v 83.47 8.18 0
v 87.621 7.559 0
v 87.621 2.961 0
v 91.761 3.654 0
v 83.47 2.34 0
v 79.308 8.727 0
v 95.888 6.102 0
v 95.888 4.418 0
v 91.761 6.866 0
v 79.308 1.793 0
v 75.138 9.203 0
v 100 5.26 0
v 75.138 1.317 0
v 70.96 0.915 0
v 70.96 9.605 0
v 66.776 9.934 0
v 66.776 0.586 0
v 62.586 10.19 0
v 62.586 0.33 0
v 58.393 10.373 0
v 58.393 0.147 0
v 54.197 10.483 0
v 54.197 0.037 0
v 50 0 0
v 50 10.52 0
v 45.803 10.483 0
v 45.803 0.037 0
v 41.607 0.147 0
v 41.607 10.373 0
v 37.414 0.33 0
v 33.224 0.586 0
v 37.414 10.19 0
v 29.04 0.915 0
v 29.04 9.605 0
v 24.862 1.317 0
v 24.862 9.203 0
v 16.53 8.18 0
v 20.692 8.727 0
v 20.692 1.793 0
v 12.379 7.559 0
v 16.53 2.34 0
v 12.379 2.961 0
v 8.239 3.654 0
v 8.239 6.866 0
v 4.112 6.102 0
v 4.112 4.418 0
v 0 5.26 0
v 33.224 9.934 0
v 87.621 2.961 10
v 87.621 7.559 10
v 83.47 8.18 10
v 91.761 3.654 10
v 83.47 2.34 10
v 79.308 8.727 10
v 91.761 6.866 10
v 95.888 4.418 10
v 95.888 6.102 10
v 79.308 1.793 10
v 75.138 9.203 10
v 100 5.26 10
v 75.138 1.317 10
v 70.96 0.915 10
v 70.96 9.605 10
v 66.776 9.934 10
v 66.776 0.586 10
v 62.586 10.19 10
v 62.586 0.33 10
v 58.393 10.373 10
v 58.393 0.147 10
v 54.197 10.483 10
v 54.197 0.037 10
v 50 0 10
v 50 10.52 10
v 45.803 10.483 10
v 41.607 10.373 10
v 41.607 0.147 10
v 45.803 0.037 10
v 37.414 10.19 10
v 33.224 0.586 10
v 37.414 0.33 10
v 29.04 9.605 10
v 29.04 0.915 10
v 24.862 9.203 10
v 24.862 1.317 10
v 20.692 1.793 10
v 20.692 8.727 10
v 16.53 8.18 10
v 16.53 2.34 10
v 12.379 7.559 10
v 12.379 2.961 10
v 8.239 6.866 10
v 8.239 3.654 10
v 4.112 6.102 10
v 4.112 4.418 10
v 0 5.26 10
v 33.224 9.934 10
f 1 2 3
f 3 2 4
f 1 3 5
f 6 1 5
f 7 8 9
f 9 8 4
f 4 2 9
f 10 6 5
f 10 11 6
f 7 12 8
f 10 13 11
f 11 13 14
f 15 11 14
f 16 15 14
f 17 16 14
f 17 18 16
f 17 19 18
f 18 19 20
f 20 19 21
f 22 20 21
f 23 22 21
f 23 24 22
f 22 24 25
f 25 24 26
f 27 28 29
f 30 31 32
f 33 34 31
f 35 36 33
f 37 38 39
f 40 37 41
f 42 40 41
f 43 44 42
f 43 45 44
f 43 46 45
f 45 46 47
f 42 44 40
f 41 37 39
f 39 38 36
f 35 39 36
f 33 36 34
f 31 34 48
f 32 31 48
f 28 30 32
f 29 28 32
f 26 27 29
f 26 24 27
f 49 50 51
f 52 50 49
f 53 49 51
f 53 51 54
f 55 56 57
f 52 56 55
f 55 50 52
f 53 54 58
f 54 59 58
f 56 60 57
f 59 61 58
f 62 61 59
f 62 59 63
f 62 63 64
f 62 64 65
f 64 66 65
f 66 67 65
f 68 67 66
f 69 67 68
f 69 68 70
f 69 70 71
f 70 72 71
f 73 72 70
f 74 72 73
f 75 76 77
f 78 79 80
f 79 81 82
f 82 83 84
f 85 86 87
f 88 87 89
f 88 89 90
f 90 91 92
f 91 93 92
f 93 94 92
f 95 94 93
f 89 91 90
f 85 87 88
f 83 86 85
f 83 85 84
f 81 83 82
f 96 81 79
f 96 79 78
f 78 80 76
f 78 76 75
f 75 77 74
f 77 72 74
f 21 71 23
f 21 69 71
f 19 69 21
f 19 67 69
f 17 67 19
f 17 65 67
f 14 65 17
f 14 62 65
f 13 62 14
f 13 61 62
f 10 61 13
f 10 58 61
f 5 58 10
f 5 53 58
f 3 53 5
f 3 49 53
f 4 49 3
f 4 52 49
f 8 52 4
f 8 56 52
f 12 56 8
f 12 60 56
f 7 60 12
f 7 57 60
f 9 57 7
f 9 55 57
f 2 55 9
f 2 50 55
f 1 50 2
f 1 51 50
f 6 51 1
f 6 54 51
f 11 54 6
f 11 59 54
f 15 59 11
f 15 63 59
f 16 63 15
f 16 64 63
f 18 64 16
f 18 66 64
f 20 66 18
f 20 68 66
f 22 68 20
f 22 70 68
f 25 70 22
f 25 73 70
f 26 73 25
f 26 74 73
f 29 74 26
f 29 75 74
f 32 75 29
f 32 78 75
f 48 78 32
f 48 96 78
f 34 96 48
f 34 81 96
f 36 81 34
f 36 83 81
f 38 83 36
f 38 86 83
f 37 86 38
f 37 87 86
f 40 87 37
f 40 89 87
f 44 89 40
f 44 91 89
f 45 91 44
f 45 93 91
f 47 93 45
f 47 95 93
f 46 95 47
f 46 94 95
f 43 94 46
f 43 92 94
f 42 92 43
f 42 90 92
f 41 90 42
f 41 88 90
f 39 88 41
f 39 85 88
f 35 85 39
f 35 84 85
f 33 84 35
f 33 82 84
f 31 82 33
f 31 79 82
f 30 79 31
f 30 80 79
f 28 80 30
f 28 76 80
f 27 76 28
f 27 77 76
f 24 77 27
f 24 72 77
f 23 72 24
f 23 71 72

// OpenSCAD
$fn = 32;

// ----------------------------------------------------------------------
// Arc profile plate: lens, 48 points
// ----------------------------------------------------------------------

// --- parameters (mm) ---
lens_chord = 100;         // chord length of the lens, X
arc_r = 240.49;           // radius of both arcs
arc_angle = 24;           // angle of each arc, degrees
sagitta = 5.26;           // bulge of each arc (half the lens height)
arc_step = 1;             // sampling step of the arcs, degrees
plate_t = 10;             // plate thickness, Z

bbox_y = 2 * sagitta;  // full lens height

profile = [[100, 5.26], [95.888, 6.102], [91.761, 6.866], [87.621, 7.559], [83.47, 8.18], [79.308, 8.727], [75.138, 9.203], [70.96, 9.605], [66.776, 9.934], [62.586, 10.19], [58.393, 10.373], [54.197, 10.483], [50, 10.52], [45.803, 10.483], [41.607, 10.373], [37.414, 10.19], [33.224, 9.934], [29.04, 9.605], [24.862, 9.203], [20.692, 8.727], [16.53, 8.18], [12.379, 7.559], [8.239, 6.866], [4.112, 6.102], [0, 5.26], [4.112, 4.418], [8.239, 3.654], [12.379, 2.961], [16.53, 2.34], [20.692, 1.793], [24.862, 1.317], [29.04, 0.915], [33.224, 0.586], [37.414, 0.33], [41.607, 0.147], [45.803, 0.037], [50, 0], [54.197, 0.037], [58.393, 0.147], [62.586, 0.33], [66.776, 0.586], [70.96, 0.915], [75.138, 1.317], [79.308, 1.793], [83.47, 2.34], [87.621, 2.961], [91.761, 3.654], [95.888, 4.418]];  // primary outline, 48 points, counter clockwise

// --- the one profile operation ---
linear_extrude(height = plate_t) polygon(points = profile);
